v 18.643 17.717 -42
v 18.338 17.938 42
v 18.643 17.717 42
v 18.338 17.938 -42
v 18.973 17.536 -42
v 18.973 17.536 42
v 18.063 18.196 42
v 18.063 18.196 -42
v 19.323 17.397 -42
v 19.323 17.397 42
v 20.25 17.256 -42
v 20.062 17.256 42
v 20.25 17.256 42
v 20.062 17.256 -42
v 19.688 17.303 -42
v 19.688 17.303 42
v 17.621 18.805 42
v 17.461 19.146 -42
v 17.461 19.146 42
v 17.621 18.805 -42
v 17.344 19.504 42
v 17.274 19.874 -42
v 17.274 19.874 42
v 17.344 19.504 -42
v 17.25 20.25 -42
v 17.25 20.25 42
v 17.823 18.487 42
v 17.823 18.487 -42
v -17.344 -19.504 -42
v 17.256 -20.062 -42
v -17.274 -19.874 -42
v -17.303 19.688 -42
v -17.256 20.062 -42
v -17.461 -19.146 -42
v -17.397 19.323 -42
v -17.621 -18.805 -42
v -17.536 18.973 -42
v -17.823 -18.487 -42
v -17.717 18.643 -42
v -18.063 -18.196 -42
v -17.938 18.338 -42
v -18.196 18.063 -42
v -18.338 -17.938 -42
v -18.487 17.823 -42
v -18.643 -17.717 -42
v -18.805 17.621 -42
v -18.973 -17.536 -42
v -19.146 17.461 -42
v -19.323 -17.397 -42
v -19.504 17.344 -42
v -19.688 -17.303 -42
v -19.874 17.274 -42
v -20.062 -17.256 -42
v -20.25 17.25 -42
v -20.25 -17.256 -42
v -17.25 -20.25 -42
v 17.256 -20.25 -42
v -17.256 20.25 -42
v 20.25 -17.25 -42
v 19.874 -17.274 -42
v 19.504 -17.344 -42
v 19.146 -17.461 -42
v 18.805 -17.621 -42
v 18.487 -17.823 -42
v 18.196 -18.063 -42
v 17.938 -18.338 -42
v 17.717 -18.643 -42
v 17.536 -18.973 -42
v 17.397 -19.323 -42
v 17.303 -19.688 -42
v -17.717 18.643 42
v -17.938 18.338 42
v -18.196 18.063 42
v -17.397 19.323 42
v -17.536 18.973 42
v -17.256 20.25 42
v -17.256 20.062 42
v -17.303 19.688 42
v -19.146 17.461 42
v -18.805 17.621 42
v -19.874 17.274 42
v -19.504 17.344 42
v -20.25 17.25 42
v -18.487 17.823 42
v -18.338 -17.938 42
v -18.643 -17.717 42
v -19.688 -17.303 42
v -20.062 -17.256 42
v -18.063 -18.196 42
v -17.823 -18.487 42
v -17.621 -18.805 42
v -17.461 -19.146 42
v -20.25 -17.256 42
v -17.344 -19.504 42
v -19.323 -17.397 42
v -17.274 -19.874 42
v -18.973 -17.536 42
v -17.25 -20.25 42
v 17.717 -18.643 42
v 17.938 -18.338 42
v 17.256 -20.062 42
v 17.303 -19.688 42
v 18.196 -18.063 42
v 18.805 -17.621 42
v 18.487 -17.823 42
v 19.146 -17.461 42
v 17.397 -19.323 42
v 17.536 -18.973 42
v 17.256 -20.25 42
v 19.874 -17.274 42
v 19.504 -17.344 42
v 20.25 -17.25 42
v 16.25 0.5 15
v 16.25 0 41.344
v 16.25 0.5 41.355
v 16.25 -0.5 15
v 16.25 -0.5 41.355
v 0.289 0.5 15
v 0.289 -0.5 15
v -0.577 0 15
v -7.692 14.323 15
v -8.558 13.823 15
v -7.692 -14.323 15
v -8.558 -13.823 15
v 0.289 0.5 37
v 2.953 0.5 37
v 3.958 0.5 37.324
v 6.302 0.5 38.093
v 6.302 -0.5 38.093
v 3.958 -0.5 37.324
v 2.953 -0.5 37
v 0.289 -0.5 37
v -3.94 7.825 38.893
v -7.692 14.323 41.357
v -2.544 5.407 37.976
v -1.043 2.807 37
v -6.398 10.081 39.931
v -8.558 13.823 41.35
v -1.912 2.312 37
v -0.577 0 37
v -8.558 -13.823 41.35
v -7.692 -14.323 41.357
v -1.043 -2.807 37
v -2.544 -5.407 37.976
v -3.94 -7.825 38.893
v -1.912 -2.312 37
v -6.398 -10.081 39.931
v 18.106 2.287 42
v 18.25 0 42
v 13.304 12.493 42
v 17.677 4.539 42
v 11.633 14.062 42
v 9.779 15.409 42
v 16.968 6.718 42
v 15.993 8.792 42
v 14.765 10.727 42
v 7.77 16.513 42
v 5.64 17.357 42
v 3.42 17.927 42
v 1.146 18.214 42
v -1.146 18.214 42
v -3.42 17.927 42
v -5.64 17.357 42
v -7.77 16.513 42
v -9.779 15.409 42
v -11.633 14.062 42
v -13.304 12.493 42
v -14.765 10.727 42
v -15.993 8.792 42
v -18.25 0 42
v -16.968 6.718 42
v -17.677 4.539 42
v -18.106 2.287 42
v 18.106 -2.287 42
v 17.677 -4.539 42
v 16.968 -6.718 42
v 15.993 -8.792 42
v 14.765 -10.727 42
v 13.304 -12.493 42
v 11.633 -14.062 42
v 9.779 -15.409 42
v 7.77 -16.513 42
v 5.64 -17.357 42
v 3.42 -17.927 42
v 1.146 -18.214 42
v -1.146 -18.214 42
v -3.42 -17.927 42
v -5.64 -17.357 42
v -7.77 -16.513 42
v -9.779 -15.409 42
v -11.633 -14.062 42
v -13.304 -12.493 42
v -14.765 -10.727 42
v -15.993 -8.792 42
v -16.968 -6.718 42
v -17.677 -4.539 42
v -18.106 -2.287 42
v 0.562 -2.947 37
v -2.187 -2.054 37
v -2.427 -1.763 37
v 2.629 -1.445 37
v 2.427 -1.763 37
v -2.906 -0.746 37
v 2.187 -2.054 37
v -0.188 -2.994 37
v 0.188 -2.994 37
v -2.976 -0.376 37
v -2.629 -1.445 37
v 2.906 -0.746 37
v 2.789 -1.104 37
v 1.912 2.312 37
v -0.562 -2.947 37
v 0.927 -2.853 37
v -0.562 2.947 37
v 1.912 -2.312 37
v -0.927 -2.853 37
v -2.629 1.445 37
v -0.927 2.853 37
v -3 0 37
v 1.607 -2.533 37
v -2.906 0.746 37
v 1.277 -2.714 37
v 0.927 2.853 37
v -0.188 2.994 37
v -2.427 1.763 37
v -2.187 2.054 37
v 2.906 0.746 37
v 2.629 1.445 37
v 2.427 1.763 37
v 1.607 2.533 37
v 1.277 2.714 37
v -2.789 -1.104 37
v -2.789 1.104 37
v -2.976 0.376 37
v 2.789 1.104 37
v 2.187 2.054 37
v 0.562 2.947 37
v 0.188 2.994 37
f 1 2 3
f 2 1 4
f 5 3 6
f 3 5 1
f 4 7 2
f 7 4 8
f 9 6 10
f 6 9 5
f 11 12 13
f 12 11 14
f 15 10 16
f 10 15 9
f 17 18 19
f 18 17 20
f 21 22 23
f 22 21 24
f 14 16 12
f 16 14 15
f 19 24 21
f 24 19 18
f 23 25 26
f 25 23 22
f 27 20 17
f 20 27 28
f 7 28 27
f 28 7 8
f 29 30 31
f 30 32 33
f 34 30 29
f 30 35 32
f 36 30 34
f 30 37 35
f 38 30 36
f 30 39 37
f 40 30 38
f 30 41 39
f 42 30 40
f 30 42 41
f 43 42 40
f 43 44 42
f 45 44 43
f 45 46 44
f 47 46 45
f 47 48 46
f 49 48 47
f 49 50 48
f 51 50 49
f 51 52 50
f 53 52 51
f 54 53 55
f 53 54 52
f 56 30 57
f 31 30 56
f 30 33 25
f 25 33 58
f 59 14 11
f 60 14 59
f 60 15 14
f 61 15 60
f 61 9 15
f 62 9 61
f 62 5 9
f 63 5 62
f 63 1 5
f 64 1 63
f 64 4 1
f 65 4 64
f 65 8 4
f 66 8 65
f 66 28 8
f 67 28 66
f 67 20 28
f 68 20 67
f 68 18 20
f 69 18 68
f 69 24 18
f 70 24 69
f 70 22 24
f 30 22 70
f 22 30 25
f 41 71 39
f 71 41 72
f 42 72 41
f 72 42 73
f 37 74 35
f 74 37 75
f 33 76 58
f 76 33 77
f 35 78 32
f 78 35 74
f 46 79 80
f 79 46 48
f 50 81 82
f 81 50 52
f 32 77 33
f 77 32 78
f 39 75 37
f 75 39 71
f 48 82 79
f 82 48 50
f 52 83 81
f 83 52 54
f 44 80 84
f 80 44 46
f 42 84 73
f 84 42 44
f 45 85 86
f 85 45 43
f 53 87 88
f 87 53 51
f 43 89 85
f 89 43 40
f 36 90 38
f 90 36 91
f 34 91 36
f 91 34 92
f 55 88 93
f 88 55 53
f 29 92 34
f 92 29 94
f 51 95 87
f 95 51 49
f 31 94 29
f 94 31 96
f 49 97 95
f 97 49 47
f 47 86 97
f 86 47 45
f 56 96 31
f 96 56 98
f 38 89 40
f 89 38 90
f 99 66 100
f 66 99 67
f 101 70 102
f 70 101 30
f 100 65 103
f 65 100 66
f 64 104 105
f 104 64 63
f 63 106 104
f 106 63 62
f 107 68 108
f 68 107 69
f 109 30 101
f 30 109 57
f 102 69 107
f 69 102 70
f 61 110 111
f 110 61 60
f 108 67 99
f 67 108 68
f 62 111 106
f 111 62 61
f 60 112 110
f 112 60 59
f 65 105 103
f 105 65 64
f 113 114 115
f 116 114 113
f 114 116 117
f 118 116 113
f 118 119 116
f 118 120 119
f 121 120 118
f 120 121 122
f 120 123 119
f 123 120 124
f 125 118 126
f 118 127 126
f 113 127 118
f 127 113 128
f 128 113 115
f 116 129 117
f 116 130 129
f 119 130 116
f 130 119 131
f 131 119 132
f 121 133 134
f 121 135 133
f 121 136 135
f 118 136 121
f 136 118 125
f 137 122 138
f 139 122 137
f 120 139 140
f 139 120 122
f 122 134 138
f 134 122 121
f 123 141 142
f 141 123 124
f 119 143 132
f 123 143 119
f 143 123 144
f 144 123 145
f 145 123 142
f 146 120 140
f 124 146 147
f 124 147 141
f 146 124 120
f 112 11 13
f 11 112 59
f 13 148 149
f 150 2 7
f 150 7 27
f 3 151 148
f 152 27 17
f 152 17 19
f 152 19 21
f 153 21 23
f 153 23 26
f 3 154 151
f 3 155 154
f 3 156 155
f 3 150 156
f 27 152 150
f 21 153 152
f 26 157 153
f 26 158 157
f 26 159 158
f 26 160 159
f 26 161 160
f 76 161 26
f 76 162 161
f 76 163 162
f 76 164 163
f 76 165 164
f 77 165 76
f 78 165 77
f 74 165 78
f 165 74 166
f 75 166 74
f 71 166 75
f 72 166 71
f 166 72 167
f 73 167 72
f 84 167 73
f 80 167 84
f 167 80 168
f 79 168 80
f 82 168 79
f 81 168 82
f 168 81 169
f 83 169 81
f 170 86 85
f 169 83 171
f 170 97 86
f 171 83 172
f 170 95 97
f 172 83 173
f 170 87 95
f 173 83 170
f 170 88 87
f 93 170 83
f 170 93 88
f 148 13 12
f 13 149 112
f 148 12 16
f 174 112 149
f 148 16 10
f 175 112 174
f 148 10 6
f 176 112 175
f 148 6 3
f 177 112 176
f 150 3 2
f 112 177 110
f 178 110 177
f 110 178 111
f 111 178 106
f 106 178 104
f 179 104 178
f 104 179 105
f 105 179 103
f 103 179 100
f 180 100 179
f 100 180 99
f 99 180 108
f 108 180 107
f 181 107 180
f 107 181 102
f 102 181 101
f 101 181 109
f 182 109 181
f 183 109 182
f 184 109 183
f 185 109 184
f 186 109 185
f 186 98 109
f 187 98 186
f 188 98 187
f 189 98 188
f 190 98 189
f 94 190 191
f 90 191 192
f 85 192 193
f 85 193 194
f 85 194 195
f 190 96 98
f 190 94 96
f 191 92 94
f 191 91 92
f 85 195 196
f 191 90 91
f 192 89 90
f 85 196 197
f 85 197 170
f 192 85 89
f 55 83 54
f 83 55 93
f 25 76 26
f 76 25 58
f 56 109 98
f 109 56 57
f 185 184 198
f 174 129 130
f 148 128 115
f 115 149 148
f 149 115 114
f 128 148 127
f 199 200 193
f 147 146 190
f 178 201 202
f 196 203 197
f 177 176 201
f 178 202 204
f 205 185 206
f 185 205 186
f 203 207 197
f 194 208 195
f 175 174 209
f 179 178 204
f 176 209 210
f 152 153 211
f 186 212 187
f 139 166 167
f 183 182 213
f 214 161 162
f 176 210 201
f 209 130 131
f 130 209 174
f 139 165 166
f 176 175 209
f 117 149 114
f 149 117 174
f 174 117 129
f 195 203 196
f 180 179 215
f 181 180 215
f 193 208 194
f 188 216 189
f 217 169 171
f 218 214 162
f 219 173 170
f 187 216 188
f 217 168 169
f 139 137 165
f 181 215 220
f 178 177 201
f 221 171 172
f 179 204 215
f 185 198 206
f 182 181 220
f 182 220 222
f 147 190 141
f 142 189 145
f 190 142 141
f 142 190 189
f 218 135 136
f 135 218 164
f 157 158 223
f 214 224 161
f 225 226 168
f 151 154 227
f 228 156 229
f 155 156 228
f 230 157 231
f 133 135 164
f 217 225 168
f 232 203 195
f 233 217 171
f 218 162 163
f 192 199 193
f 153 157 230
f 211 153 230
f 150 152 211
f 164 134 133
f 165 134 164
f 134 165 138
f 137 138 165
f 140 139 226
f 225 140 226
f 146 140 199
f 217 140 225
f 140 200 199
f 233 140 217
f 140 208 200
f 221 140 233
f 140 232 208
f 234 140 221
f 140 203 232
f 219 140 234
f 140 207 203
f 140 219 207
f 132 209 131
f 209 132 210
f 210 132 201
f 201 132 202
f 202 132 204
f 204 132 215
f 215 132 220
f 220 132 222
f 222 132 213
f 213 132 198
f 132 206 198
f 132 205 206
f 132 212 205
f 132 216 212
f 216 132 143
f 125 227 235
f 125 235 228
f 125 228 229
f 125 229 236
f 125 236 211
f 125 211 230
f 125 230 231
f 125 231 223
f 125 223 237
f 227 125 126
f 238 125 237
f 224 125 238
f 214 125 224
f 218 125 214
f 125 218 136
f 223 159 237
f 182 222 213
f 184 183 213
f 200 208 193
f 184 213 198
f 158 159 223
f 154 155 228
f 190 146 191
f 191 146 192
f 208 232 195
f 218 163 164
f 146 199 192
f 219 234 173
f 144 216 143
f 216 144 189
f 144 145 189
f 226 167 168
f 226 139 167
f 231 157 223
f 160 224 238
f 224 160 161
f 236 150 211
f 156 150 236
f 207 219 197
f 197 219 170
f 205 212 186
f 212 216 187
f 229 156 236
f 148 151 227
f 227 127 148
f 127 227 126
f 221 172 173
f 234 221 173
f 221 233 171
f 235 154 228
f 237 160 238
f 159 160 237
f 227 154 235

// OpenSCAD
/* [Global] */
// Number of Collet Places in a row
rows=1; // [1:50]
// Number of Collet Places in a column
columns=1; // [1:50]
// Type of Collet, currently ER only
collettype="5CWrench"; //["ER", "5C"]
// Specify If box bottom should be open, or not
openbottom="no"; // [yes, no]
// Create Top Cover?
topcover="no"; // [yes, no]
// Smoothness of cones in STL
smooth=50; // [10:rough, 50:medium, 100:fine]
/* [ER] */
// Size of the collet (for ER collets)
colletsizeER=25; // [8:ER8, 11:ER11, 16:ER16, 20:ER20, 25:ER25, 32:ER32, 40:ER40, 50:ER50]
/* [5C] */
// Render legs for the rack or just the plain rack or fully solid?
standtype="full"; // [rack, legs, full]
/////////////////////////////////////////////////////////////////
/* [Hidden] */
//Static Things
/*er8=[8,10.9,13.6]; //Diameter, Lenght of Long cone, total lenght of collet
er11=[11,13.5,18];
er16=[16,20.8,27.5];
er20=[20,23.9,31.5];
er25=[25,25.9,34];
er32=[32,30.9,40];
er40=[40,34.9,46];
er50=[50,46,60];
//Collet Specs taken from http://www.rego-fix.com/fileadmin/user_upload/Bilder_Zeichnungen_PDF/home/Produkte/Technische_Infos/REGO-FIX_ER_Dimensions_ER_Collets.pdf
// Another source of sizes http://www.takayama-shoji.co.jp/rego/pdf/13_technical_information.pdf
// yet another source http://www.tyler.net/drspiff/machining/collets/Collets.htm
*/

module draw_er_collet(diameter, longcone, colletlenght, openbottom, clamprange) {
	for (xpos=[1:rows], ypos = [1:columns]) {
		if (openbottom=="no") {
			translate([xpos*(diameter+2.999), ypos*(diameter+2.999), longcone/2+1.5]) difference () {
				if (openbottom=="no") {
					translate ([0,0,-1]) cube(size = [diameter+3,diameter+3,longcone+1], center = true); 	
				} else {
					cube(size = [diameter+3,diameter+3,longcone], center = true); 	
				} //endif
					cylinder(h = longcone, r1 = (diameter-2*longcone*tan(8))/2+clamprange, r2 = diameter/2+clamprange, center = true, $fn=smooth );
			} // enddifference
		} else {
			translate([xpos*(diameter+2.999), ypos*(diameter+2.999), longcone/2]) difference () {
				if (openbottom=="no") {
					translate ([0,0,-1]) cube(size = [diameter+3,diameter+3,longcone+1], center = true); 	
				} else {
					cube(size = [diameter+3,diameter+3,longcone], center = true); 	
				}
					cylinder(h = longcone+0.001, r1 = (diameter-2*longcone*tan(8))/2+clamprange, r2 = diameter/2+clamprange, center = true, $fn=smooth );			
			}// enddifference
		} //endif
		if (topcover=="yes") {
			if (openbottom=="no") {
				translate([-xpos*(diameter+2.999), ypos*(diameter+2.999), (colletlenght-longcone)/2+1.5]) difference () {
					if (openbottom=="no") {
						translate ([0,0,-1]) cube(size = [diameter+3,diameter+3,colletlenght-longcone+2], center = true); 	
					} else {
						cube(size = [diameter+3,diameter+3,colletlenght-longcone], center = true); 	
					}
					cylinder(h = colletlenght-longcone+1, r1 = (diameter-2*longcone*tan(8))/2+2+clamprange, r2 = diameter/2+clamprange, center = true, $fn=smooth );
				}//enddifference
			}else {
				translate([-xpos*(diameter+2.999), ypos*(diameter+2.999), (colletlenght-longcone)/2]) difference () {
					if (openbottom=="no") {
						translate ([0,0,-1]) cube(size = [diameter+3,diameter+3,colletlenght-longcone+1], center = true); 	
					} else {
						cube(size = [diameter+3,diameter+3,colletlenght-longcone], center = true); 	
					}
					cylinder(h = colletlenght-longcone+0.001, r1 = (diameter-2*longcone*tan(6))/2+clamprange, r2 = diameter/2+clamprange, center = true, $fn=smooth );
				}//enddifference
			}//endif
		}//endif
	} //endfor
} //endmodule

module set_collet_parameters (type, size) {
	if (type=="ER") {
		if (size==8) { //Collet Diameter; Lenght of Long cone; total lenght of collet;the collet is bigger this size, when it is open (in radius)
			draw_er_collet (8,10.9,13.6,openbottom,0.3); 
		}
		if (size==11) {
			draw_er_collet (11,13.5,18,openbottom,0.5); 
		}
		if (size==16) {
			draw_er_collet (16,20.8,27.5,openbottom,0.8); 
		}
		if (size==20) {
			draw_er_collet (20,23.9,31.5,openbottom,1); 
		}
		if (size==25) {
			draw_er_collet (25,25.9,34,openbottom,1); 
		}
		if (size==32) {
			draw_er_collet (32,30.9,40,openbottom,1); 
		}
		if (size==40) {
			draw_er_collet (40,34.9,46,openbottom,1); 
		}
		if (size==50) {
			draw_er_collet (50,46,60,openbottom,1); 
		}
	}

}

module draw_5c_collet(diameter, cone, lenght) {
	for (xpos=[1:rows], ypos = [1:columns]) {
		translate([xpos*(diameter+3.999), ypos*(diameter+3.999), cone/2+1.5]) difference () {
			cube(size = [diameter+4,diameter+4,lenght], center = true); 	
			translate([0,0,(lenght-cone)/2])	cylinder(h = cone, r1 = (diameter-2*cone*tan(10))/2, r2 = diameter/2, center = true, $fn=smooth );
			cylinder(h = lenght, r1 = (diameter-2*cone*tan(10))/2, r2 = (diameter-2*cone*tan(10))/2, center = true, $fn=smooth );
			translate([diameter,diameter,cone/2]) cylinder(h = cone, r1 = 6, r2 = 6, center = true, $fn=smooth );
			for (a= [0:3]){
				rotate ([0,0,a*90]) translate([diameter/2+2,diameter/2+2,cone/2]) cylinder(h = cone+lenght, r1 = 3, r2 = 3, center = true, $fn=smooth );
			} //endfor	
		} // enddifference
	} //endfor
} //endmodule

module 5c_collet_wrench(diameter, cone, lenght) {
difference () {
			cube(size = [40.5,40.5,84], center = true); 	
			translate([0,0,(lenght-cone)/2])	cylinder(h = cone, r1 = 3, r2 = diameter/2, center = true, $fn=smooth );
		for (a= [0:3]){
				rotate ([0,0,a*90]) translate([diameter/2+2,diameter/2+2,cone/2]) cylinder(h = cone+lenght, r1 = 3, r2 = 3, center = true, $fn=smooth );
			} //endfor	
		for (a= [0:2]){
				rotate ([0,0,a*120]) translate([(diameter/2-2)/2,0,lenght/3+1]) cube(size = [diameter/2-2,1,lenght/3], center = true, $fn=smooth );
			} //endfor	

		} // enddifference
} //endmodule

module 5c_racktype (type, diameter, cone, lenght) {
	if (type=="full"){
		draw_5c_collet(diameter, cone, lenght);
	}
	if (type=="rack"){
		draw_5c_collet(diameter, cone, cone);
	}


}

if (collettype=="ER") {
	set_collet_parameters(collettype,colletsizeER);
}
if (collettype=="5C") {
	5c_racktype(standtype,36.5,16.3,84);
}
if (collettype=="5CWrench") {
	5c_collet_wrench(36.5,5,84);
}
